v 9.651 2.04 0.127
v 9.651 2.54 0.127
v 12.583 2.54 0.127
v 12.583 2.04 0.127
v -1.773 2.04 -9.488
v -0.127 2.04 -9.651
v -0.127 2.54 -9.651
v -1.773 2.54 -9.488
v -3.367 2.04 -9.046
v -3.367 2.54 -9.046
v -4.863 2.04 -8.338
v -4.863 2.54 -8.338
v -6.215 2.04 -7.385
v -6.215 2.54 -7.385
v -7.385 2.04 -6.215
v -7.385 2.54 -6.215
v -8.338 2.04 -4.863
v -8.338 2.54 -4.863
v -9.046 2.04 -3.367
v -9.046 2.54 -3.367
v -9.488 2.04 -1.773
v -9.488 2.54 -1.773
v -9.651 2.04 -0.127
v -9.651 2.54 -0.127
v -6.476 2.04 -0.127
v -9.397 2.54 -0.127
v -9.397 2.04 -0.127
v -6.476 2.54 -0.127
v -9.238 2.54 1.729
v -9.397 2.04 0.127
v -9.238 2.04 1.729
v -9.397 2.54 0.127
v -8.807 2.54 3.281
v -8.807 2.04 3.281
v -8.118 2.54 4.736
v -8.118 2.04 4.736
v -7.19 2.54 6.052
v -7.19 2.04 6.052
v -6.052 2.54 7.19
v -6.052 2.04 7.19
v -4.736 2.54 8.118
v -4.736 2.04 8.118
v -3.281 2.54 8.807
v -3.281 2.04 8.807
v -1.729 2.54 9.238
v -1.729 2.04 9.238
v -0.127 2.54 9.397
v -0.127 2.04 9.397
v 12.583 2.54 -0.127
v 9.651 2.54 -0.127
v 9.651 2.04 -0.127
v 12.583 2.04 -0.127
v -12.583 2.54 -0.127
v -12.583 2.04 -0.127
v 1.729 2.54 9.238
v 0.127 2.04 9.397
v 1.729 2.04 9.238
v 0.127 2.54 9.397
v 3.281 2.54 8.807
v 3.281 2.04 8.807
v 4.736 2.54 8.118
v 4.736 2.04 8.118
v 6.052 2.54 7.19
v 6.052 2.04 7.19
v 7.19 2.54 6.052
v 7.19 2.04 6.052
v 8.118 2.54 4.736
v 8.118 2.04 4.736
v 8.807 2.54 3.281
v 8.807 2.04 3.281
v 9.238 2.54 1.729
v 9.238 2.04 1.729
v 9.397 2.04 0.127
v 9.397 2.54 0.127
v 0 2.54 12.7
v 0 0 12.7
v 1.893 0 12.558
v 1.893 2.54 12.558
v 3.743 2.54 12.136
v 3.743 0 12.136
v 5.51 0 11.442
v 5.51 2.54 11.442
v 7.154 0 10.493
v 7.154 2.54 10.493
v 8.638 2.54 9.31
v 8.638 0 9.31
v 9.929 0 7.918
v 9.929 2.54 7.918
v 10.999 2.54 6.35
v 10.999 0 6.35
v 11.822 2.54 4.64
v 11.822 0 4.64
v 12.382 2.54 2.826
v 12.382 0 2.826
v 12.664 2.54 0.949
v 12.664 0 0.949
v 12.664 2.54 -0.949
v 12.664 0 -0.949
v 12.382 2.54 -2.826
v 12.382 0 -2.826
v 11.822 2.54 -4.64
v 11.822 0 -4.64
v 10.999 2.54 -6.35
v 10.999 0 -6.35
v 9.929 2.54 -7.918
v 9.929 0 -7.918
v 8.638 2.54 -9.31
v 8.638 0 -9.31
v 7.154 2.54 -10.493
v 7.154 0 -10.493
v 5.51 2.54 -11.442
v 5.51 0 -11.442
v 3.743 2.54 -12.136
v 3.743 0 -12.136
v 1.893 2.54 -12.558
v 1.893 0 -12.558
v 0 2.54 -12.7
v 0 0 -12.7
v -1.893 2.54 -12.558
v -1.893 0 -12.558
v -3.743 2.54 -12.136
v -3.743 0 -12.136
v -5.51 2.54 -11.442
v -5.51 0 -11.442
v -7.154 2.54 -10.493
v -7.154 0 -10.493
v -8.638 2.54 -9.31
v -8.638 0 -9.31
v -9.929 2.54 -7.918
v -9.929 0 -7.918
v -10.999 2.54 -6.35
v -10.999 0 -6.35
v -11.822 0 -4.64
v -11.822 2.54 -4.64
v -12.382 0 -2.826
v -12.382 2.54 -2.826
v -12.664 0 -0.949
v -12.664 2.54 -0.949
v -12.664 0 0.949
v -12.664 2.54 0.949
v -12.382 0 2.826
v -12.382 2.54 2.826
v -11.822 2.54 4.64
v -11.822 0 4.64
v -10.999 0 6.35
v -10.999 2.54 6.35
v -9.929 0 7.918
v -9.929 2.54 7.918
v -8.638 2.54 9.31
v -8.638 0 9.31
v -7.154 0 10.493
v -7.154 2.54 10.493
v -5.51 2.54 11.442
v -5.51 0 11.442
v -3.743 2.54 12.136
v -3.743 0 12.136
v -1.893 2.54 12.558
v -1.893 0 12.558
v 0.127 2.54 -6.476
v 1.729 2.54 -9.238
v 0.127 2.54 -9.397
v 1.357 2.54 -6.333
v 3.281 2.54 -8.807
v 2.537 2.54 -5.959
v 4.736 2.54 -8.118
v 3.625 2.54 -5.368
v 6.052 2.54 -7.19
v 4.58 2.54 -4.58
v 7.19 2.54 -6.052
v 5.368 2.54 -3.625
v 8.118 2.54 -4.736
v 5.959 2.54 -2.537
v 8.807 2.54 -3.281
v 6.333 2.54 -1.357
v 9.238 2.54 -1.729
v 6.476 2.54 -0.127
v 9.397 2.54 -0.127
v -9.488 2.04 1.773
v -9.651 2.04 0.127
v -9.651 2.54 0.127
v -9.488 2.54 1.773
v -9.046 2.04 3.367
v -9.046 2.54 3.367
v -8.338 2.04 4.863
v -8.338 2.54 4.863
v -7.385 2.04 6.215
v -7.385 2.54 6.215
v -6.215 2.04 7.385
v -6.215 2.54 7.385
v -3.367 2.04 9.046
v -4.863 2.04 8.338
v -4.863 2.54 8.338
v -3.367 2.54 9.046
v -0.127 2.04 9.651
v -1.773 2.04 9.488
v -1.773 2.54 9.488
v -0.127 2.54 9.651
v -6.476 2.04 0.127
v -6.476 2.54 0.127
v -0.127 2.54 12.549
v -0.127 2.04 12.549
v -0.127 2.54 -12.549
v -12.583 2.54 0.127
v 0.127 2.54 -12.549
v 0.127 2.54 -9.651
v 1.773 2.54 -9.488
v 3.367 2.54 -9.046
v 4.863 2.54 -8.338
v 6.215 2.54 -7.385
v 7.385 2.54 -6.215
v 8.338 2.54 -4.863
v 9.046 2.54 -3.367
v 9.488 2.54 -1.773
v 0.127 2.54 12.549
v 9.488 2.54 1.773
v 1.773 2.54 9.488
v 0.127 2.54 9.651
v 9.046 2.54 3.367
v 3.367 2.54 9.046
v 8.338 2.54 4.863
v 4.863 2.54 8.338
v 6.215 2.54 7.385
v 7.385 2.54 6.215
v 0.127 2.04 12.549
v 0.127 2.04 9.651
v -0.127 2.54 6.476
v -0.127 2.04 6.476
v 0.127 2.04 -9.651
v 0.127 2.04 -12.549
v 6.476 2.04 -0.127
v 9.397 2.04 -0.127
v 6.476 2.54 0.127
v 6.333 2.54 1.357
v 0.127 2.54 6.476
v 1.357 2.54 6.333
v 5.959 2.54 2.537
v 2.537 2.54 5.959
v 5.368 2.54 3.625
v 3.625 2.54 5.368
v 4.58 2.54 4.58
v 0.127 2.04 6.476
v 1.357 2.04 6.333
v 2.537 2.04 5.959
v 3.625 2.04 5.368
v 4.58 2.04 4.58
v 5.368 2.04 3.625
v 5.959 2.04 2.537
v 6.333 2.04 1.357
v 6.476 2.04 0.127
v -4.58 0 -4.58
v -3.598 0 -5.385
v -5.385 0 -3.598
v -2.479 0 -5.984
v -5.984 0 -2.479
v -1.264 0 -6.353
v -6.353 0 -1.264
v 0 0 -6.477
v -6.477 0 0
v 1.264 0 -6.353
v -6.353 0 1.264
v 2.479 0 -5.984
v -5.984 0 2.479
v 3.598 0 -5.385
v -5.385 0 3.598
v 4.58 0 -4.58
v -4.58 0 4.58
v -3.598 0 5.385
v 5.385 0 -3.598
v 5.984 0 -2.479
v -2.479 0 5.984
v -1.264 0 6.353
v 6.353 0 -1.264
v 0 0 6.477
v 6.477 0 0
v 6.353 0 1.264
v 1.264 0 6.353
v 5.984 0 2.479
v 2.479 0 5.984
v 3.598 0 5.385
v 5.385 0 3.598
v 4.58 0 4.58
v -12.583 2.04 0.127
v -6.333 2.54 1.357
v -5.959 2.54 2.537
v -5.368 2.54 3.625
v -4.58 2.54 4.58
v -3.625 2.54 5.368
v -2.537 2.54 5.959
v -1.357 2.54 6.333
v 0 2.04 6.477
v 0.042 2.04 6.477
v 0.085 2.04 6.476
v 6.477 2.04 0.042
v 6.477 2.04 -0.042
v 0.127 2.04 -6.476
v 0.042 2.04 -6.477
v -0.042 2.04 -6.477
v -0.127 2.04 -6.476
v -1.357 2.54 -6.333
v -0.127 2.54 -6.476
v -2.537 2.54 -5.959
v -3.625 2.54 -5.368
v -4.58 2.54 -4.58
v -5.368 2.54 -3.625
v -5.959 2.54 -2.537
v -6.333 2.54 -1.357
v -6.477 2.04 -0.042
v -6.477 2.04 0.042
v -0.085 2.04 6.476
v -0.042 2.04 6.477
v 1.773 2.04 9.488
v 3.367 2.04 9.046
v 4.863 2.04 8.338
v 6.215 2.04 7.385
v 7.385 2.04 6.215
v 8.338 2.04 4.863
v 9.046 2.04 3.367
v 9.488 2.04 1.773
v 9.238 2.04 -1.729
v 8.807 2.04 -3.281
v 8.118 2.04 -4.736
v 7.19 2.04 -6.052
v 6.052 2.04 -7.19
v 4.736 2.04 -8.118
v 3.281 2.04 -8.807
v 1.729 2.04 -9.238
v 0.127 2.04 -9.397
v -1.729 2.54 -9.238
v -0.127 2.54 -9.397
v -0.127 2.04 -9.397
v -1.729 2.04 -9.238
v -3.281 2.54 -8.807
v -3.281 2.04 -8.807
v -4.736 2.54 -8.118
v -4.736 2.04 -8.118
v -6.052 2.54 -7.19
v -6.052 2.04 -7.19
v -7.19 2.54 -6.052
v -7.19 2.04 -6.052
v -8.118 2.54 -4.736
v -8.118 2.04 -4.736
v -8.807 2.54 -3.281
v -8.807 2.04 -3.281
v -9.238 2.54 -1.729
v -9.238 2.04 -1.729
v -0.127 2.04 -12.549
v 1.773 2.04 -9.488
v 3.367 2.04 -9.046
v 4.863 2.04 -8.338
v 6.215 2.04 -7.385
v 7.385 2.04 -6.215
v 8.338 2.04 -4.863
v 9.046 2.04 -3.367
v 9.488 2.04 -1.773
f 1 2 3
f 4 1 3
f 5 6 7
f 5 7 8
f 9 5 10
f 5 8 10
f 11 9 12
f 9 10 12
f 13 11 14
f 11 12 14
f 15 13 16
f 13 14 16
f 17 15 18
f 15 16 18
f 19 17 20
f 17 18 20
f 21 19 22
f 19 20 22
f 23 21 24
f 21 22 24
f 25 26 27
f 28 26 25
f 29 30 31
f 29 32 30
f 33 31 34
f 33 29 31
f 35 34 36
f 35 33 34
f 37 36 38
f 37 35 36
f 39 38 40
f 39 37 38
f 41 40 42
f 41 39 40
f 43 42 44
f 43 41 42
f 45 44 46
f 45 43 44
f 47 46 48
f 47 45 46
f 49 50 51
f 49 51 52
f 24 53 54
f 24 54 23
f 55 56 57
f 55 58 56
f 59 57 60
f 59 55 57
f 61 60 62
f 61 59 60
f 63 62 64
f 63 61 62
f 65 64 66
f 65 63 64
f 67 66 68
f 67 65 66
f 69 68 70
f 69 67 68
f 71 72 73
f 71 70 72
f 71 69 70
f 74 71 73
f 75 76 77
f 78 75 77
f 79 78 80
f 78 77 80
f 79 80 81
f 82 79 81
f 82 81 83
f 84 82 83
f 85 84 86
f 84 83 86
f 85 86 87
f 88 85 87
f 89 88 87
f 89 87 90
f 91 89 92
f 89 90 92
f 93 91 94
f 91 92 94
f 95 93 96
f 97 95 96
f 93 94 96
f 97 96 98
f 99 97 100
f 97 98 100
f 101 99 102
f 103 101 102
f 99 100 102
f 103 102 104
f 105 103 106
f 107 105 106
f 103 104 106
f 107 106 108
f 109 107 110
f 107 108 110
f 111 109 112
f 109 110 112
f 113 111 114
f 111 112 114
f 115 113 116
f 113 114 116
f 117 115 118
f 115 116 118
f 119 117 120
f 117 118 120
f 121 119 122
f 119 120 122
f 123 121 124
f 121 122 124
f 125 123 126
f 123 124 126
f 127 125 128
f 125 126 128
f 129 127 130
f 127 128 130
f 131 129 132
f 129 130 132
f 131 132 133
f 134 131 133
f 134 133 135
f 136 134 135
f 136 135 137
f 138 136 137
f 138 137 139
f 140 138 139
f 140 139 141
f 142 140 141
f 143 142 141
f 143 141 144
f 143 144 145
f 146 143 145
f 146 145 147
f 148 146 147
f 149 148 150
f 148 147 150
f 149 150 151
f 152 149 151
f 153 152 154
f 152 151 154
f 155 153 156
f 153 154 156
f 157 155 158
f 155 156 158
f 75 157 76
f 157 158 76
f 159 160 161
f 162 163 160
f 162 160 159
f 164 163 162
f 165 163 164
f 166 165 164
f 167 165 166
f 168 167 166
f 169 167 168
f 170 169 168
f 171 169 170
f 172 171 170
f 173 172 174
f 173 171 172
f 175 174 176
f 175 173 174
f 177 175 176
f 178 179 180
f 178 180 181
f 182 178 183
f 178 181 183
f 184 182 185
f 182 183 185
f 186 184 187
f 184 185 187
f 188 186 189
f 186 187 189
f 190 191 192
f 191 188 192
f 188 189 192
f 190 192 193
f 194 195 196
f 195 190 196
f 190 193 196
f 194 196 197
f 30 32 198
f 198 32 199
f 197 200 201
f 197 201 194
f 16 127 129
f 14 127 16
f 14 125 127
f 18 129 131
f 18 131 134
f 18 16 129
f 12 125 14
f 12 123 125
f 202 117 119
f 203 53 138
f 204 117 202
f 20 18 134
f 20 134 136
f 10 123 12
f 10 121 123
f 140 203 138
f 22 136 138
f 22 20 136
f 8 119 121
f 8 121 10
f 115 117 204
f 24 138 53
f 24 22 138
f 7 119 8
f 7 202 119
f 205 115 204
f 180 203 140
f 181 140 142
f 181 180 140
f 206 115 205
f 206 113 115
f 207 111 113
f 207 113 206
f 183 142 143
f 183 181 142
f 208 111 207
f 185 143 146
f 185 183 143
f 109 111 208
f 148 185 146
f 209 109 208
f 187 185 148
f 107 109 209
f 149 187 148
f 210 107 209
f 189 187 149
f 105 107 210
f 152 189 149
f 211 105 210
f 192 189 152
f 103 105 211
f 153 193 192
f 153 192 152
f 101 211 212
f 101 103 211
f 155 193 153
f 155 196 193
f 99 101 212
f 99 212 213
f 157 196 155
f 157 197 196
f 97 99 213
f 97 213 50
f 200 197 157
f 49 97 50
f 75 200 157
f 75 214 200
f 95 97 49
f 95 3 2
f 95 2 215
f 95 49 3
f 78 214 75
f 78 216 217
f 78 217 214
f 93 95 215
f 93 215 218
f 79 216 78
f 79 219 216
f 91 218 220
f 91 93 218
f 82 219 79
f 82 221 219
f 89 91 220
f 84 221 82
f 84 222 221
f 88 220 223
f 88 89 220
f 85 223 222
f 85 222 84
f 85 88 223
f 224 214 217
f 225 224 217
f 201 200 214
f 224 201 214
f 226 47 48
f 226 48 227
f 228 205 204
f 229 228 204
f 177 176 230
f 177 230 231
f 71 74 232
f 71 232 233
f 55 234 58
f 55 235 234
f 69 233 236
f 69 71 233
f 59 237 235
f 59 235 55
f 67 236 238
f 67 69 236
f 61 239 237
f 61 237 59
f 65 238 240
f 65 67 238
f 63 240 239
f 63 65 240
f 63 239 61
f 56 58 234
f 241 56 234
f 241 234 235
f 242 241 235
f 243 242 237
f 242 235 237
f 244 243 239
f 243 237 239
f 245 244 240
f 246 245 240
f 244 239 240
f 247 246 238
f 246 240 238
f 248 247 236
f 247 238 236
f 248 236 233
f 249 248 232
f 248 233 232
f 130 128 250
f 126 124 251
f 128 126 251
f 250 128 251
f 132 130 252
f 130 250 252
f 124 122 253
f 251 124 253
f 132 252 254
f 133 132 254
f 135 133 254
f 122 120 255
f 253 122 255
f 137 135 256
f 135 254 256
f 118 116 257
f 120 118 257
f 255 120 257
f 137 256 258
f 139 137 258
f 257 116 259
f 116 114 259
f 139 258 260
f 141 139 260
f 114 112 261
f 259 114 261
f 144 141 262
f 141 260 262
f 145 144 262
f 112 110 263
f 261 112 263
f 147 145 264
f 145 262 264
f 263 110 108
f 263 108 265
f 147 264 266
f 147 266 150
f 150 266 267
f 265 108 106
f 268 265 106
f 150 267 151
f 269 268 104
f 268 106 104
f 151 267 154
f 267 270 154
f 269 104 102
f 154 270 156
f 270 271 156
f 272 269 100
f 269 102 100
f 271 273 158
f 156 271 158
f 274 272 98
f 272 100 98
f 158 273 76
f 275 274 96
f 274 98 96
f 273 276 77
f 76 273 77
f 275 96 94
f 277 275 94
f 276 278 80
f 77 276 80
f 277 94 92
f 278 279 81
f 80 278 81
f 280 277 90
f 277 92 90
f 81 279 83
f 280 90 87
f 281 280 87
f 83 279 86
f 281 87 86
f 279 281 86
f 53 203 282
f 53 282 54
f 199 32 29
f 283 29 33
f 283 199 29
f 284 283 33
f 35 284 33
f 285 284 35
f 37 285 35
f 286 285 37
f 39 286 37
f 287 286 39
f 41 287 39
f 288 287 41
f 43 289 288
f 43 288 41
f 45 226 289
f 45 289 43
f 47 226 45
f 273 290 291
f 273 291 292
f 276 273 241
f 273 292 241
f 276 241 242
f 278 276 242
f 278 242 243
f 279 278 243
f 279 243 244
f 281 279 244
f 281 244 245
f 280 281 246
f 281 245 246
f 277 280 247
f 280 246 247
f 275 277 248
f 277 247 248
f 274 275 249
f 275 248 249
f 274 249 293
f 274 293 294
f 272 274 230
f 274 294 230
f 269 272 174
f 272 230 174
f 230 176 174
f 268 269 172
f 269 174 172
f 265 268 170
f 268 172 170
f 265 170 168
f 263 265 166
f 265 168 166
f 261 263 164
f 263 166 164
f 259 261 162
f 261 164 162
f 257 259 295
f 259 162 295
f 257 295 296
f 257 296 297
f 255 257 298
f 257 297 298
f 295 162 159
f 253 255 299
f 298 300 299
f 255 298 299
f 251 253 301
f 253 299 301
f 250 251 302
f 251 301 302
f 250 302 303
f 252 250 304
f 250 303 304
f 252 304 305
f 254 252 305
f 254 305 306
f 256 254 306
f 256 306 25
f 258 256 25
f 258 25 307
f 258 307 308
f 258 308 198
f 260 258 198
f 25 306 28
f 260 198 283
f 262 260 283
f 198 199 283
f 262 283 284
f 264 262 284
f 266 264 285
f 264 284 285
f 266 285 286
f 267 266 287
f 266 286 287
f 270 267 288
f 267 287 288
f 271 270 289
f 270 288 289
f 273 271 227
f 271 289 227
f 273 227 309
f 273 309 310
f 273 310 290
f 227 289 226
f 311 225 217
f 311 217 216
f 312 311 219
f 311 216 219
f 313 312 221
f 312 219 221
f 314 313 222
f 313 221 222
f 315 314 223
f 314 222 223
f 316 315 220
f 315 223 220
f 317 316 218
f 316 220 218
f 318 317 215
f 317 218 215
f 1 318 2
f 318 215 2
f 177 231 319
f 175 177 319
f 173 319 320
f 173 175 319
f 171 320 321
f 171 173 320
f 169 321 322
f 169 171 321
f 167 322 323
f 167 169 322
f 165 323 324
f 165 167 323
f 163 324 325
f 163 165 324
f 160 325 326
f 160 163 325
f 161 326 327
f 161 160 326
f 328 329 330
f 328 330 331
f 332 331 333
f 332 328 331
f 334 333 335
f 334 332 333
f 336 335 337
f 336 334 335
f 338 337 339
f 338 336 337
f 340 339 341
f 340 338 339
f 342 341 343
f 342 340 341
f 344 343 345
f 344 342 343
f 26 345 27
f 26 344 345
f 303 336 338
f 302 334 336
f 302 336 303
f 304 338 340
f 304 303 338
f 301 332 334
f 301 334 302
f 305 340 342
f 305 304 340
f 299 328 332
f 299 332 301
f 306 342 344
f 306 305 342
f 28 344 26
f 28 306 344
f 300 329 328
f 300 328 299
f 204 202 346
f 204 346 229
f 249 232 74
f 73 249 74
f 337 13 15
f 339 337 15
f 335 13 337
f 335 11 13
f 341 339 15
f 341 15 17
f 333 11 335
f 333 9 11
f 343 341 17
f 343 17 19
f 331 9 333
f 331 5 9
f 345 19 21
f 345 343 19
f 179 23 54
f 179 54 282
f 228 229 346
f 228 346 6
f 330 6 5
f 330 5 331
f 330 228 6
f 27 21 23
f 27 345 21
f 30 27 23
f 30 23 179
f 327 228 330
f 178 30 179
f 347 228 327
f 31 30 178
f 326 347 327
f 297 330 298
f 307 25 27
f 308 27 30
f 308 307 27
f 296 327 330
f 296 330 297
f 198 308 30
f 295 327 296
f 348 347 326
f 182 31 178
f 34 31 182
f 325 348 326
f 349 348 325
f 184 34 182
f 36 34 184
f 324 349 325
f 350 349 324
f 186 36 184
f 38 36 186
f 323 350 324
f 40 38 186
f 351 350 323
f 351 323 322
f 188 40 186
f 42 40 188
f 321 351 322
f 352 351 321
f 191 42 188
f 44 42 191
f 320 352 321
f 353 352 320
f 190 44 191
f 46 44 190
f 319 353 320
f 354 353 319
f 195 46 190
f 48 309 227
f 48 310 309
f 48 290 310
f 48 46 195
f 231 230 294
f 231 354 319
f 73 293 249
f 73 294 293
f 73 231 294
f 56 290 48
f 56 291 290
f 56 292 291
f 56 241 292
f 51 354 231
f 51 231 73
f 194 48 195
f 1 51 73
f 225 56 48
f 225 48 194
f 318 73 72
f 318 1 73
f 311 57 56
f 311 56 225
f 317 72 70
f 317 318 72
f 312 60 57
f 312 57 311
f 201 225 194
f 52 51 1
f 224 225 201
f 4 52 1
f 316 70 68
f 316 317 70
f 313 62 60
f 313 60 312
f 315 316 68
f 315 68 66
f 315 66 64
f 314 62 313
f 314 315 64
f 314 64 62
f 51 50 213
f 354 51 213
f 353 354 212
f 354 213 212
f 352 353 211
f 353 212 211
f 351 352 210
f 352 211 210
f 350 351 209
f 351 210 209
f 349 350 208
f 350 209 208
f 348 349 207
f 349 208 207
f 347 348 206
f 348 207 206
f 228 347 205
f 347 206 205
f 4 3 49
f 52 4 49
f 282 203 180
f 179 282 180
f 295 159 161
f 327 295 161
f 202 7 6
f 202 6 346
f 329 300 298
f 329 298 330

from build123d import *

# Parameters (mm, degrees)
SKETCH1_R           = 12.7
BOSS_EXTRUDE1_DEPTH = 2.54
SKETCH2_R           = 6.477
SKETCH2_R_2         = 6.223
CUT_EXTRUDE1_DEPTH  = 0.5
SKETCH3_R           = 3.302
SKETCH3_R_2         = 3.048
CUT_EXTRUDE2_DEPTH  = 0.5
SKETCH4_R           = 0.25
CUT_EXTRUDE3_DEPTH  = 0.5
SKETCH5_R           = 9.652
SKETCH5_R_2         = 9.398
CUT_EXTRUDE4_DEPTH  = 0.5
SKETCH6_W           = 25.165512812
SKETCH6_H           = 0.254
CUT_EXTRUDE5_DEPTH  = 0.5
SKETCH7_W           = 0.254
SKETCH7_H           = 25.09846579
CUT_EXTRUDE6_DEPTH  = 0.5
SKETCH8_R           = 6.477
CUT_EXTRUDE7_DEPTH  = 10


with BuildPart() as part:
    # Sketch1 → Boss-Extrude1 (new body)
    with BuildSketch(Plane(origin=(0, 0, 0), x_dir=(1, 0, 0), z_dir=(0, 1, 0))):
        with Locations(Location((0, 0, 0), (0, 0, 270))):
            Circle(SKETCH1_R)
    extrude(amount=BOSS_EXTRUDE1_DEPTH)

    # Sketch2 → Cut-Extrude1 (cut)
    with BuildSketch(Plane(origin=(0, 2.54, 0), x_dir=(1, 0, 0), z_dir=(0, 1, 0))):
        with Locations(Location((0, 0, 0), (0, 0, 270))):
            Circle(SKETCH2_R)
        with Locations(Location((0, 0, 0), (0, 0, 270))):
            Circle(SKETCH2_R_2, mode=Mode.SUBTRACT)
    extrude(amount=-CUT_EXTRUDE1_DEPTH, mode=Mode.SUBTRACT)

    # Sketch3 → Cut-Extrude2 (cut)
    with BuildSketch(Plane(origin=(0, 2.54, 0), x_dir=(1, 0, 0), z_dir=(0, 1, 0))):
        with Locations(Location((0, 0, 0), (0, 0, 270))):
            Circle(SKETCH3_R)
        with Locations(Location((0, 0, 0), (0, 0, 270))):
            Circle(SKETCH3_R_2, mode=Mode.SUBTRACT)
    extrude(amount=-CUT_EXTRUDE2_DEPTH, mode=Mode.SUBTRACT)

    # Sketch4 → Cut-Extrude3 (cut)
    with BuildSketch(Plane(origin=(0, 2.54, 0), x_dir=(1, 0, 0), z_dir=(0, 1, 0))):
        with Locations(Location((0, 0, 0), (0, 0, 270))):
            Circle(SKETCH4_R)
    extrude(amount=-CUT_EXTRUDE3_DEPTH, mode=Mode.SUBTRACT)

    # Sketch5 → Cut-Extrude4 (cut)
    with BuildSketch(Plane(origin=(0, 2.54, 0), x_dir=(1, 0, 0), z_dir=(0, 1, 0))):
        with Locations(Location((0, 0, 0), (0, 0, 270))):
            Circle(SKETCH5_R)
        with Locations(Location((0, 0, 0), (0, 0, 270))):
            Circle(SKETCH5_R_2, mode=Mode.SUBTRACT)
    extrude(amount=-CUT_EXTRUDE4_DEPTH, mode=Mode.SUBTRACT)

    # Sketch6 → Cut-Extrude5 (cut)
    with BuildSketch(Plane(origin=(0, 2.54, 0), x_dir=(1, 0, 0), z_dir=(0, 1, 0))):
        Rectangle(SKETCH6_W, SKETCH6_H)
    extrude(amount=-CUT_EXTRUDE5_DEPTH, mode=Mode.SUBTRACT)

    # Sketch7 → Cut-Extrude6 (cut)
    with BuildSketch(Plane(origin=(0, 2.54, 0), x_dir=(1, 0, 0), z_dir=(0, 1, 0))):
        Rectangle(SKETCH7_W, SKETCH7_H)
    extrude(amount=-CUT_EXTRUDE6_DEPTH, mode=Mode.SUBTRACT)

    # Sketch8 → Cut-Extrude7 (cut)
    with BuildSketch(Plane(origin=(0, 2.54, 0), x_dir=(1, 0, 0), z_dir=(0, 1, 0))):
        with Locations(Location((0, 0, 0), (0, 0, 270))):
            Circle(SKETCH8_R)
    extrude(amount=-CUT_EXTRUDE7_DEPTH, mode=Mode.SUBTRACT)


solid = part.part
